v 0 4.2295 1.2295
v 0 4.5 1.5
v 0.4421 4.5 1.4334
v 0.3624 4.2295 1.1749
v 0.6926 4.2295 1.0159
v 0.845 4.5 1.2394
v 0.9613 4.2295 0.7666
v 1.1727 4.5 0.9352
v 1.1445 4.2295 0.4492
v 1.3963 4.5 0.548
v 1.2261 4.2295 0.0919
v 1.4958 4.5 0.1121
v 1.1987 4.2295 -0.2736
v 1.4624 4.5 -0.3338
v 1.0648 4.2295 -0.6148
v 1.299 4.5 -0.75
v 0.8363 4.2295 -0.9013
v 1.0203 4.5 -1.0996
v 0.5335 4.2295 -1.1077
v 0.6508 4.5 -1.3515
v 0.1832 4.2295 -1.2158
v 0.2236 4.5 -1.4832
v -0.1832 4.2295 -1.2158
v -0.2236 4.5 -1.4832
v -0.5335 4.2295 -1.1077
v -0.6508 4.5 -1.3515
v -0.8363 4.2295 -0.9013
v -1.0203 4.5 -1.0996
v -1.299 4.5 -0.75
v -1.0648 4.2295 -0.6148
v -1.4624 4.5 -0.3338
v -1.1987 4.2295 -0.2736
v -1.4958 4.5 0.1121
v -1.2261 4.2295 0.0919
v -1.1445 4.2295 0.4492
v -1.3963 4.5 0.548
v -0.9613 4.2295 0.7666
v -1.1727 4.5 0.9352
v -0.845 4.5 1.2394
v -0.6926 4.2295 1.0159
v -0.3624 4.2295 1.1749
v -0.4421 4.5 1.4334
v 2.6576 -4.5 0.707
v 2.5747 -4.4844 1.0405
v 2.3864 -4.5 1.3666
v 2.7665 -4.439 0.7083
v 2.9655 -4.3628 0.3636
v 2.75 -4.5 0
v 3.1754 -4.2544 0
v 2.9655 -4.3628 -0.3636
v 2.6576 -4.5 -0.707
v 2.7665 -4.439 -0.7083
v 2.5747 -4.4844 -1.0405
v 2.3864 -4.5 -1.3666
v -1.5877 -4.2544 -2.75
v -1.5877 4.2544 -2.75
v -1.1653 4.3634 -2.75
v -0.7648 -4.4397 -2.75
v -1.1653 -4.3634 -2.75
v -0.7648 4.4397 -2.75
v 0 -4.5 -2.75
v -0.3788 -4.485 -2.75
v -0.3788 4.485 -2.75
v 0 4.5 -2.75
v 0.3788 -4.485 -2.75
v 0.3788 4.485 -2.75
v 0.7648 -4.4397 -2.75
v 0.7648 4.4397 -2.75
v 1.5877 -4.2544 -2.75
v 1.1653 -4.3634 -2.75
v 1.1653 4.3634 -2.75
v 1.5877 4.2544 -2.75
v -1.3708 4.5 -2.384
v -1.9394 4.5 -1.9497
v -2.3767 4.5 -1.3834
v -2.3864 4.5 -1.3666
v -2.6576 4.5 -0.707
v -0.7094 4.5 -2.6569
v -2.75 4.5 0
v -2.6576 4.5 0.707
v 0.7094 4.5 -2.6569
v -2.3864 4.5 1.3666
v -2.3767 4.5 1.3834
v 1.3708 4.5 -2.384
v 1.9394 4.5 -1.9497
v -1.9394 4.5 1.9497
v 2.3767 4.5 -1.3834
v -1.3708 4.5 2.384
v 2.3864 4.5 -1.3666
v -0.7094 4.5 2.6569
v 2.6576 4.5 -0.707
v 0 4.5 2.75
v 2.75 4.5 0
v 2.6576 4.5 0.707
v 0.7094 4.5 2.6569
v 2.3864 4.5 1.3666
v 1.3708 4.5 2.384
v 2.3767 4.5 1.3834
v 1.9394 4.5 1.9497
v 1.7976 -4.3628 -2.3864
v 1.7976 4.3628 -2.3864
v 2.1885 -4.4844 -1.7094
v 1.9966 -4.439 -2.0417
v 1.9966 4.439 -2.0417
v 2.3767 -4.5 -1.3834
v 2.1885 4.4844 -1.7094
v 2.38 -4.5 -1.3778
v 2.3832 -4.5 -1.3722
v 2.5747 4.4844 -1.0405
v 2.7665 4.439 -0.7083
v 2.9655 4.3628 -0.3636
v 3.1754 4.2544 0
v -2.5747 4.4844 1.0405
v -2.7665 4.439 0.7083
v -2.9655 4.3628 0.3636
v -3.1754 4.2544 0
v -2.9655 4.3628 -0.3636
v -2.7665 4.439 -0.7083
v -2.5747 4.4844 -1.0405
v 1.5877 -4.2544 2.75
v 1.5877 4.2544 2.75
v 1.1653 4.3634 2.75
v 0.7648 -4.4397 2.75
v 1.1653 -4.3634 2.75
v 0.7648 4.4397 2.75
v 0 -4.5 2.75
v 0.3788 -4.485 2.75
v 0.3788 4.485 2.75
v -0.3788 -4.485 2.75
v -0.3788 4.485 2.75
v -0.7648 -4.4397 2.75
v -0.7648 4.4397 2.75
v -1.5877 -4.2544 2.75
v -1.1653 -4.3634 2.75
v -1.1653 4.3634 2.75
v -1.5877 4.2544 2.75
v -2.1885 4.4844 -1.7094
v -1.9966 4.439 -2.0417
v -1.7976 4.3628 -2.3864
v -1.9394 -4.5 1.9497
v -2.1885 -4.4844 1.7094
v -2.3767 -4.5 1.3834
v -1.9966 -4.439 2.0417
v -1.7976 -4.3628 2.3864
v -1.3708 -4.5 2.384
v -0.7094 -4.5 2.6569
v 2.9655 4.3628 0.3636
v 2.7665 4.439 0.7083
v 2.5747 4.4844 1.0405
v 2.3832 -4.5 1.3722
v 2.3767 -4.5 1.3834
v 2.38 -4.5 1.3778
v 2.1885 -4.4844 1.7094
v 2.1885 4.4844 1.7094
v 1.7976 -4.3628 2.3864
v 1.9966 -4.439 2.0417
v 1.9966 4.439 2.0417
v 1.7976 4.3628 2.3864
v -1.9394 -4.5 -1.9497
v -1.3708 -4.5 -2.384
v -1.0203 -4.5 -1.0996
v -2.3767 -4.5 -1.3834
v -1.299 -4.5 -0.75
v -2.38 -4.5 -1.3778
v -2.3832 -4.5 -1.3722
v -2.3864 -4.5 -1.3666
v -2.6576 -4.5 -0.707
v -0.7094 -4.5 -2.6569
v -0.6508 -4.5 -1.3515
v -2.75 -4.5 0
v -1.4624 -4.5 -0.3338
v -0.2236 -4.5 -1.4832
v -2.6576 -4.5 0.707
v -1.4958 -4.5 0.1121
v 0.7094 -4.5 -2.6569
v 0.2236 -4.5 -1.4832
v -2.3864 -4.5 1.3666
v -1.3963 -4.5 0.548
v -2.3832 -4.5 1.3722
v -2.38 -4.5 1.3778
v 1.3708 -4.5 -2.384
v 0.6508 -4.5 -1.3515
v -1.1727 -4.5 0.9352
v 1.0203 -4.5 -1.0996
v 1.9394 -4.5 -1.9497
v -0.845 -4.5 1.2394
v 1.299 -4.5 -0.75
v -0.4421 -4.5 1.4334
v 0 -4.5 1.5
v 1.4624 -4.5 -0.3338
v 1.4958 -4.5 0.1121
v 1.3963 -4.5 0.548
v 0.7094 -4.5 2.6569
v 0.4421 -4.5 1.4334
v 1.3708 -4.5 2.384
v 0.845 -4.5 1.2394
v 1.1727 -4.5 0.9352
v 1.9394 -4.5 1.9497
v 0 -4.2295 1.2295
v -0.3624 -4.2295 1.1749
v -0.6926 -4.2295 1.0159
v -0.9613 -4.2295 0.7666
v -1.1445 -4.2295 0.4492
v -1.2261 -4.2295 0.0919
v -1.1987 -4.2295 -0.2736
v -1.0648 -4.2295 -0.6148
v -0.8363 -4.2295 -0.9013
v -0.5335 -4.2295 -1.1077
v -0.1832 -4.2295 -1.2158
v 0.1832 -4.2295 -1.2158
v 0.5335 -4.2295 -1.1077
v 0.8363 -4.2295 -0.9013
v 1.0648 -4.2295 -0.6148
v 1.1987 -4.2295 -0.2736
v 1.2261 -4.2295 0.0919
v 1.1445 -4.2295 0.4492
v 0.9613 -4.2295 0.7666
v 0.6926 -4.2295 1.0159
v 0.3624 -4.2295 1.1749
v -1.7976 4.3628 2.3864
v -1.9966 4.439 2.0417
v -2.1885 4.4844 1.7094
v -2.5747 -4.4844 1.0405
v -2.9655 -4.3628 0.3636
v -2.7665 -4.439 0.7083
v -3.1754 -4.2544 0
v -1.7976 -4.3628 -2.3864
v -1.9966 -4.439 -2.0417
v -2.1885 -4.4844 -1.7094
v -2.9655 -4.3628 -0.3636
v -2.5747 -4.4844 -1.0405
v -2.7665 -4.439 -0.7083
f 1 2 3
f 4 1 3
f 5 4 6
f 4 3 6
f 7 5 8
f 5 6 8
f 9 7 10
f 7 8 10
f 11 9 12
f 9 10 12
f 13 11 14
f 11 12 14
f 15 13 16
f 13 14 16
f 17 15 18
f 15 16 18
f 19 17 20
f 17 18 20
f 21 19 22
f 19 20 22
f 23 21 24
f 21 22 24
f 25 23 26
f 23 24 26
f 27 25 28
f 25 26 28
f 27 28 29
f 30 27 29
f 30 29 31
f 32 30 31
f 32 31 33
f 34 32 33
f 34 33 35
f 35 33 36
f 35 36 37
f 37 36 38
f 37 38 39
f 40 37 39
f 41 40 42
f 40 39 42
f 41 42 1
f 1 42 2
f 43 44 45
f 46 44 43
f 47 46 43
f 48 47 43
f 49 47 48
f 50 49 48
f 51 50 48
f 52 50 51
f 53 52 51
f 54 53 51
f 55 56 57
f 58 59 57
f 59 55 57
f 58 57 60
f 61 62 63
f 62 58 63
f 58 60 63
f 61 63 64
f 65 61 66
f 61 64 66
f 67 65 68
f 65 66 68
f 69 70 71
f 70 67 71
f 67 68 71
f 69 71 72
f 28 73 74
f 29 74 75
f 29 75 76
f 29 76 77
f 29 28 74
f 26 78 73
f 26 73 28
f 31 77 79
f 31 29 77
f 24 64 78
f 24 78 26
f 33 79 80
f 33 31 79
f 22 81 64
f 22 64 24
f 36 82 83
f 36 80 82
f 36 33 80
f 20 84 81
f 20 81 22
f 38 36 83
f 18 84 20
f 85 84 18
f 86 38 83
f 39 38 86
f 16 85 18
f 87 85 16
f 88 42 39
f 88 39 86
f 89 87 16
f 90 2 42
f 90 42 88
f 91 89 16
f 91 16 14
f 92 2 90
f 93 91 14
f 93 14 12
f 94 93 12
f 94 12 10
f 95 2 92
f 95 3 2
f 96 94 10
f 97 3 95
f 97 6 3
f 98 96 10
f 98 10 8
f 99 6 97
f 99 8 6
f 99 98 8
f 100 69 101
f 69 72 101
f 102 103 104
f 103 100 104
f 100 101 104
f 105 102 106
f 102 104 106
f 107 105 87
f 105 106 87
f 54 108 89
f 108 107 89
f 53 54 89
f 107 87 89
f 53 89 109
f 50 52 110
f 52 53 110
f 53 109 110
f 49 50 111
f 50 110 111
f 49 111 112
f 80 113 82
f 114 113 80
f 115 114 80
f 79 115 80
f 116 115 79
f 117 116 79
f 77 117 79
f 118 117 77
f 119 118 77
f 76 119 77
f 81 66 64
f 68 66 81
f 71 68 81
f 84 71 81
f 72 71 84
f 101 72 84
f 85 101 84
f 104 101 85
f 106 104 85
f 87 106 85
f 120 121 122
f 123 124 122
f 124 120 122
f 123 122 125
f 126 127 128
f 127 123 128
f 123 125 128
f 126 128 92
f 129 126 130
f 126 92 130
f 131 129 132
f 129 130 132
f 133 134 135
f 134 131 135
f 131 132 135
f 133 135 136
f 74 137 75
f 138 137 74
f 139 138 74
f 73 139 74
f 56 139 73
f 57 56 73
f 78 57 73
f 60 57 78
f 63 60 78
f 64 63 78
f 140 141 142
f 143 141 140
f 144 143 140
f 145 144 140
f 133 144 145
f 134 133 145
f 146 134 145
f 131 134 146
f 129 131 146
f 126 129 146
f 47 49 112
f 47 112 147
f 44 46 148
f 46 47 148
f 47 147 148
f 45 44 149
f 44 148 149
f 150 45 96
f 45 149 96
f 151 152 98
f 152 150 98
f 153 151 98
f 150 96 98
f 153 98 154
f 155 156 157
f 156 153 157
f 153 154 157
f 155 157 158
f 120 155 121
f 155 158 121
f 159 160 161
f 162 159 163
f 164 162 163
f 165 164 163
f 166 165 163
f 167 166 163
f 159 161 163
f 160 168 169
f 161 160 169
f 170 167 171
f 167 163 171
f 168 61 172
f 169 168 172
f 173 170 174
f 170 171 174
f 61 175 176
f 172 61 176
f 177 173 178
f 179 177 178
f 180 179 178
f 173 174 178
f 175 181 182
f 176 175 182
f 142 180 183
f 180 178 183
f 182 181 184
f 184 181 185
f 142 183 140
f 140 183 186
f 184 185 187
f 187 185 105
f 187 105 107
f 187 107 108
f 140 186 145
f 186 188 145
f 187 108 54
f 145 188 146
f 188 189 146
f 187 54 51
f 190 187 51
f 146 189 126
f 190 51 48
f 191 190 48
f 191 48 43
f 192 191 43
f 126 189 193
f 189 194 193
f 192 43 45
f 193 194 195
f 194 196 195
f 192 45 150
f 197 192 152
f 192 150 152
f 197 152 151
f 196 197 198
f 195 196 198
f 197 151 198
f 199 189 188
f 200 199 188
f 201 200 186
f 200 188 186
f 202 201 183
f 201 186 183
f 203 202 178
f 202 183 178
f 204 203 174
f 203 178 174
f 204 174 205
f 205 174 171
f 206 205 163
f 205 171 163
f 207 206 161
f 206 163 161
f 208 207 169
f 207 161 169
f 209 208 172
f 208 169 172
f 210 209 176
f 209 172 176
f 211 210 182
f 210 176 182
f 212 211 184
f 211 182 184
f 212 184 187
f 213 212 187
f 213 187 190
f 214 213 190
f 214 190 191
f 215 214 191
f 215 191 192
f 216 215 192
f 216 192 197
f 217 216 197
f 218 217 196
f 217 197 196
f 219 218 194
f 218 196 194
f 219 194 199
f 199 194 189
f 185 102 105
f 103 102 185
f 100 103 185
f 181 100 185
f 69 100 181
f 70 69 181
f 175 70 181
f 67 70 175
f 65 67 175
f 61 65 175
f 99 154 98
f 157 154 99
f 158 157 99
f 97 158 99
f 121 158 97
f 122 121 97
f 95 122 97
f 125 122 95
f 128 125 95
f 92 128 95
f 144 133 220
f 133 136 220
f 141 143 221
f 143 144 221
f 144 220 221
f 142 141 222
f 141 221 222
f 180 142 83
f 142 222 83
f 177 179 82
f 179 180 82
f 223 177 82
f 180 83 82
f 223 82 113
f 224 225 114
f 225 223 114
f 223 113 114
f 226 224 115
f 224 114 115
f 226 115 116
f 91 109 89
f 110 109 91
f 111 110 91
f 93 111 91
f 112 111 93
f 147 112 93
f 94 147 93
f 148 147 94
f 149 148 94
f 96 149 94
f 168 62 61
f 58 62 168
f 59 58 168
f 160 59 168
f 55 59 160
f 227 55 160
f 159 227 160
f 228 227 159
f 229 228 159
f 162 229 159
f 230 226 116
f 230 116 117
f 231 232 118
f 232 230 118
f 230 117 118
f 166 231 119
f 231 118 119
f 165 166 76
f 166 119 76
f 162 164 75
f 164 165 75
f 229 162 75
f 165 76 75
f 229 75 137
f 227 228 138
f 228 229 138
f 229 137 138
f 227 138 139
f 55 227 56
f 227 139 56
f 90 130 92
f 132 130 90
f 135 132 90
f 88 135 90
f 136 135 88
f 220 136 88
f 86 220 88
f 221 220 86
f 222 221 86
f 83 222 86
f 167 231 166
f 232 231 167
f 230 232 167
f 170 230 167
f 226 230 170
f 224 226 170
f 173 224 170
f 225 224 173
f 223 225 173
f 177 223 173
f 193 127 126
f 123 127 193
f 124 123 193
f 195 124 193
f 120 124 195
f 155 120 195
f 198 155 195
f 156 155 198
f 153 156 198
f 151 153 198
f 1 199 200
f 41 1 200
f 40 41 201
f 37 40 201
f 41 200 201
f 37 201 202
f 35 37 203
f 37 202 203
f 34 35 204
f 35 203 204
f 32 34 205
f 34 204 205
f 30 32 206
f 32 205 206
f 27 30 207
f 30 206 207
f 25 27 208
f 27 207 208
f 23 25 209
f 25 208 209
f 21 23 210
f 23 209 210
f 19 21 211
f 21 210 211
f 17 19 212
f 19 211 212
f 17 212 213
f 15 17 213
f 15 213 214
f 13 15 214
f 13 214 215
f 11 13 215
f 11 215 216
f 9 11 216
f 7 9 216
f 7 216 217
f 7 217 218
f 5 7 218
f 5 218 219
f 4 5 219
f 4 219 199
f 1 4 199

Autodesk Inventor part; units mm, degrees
ref_plane "YZ Plane" through (0, 0, 0) normal (1, 0, 0) x (0, 1, 0)
ref_plane "XZ Plane" through (0, 0, 0) normal (0, 1, 0) x (-1, 0, 0)
ref_plane "XY Plane" through (0, 0, 0) normal (0, 0, 1) x (1, 0, 0)
sketch "スケッチ1" plane through (0, 0, 0) normal (1, 0, 0) x (0, 1, 0)
  line L0 (-4.5, 0) -> (4.5, 0)
  line L1 (0, 0) -> (0, 3.1754) construction
  line L2 (-4.2544, 3.1754) -> (-4.5, 2.75)
  line L3 (-4.5, 2.75) -> (-4.5, 0)
  line L4 (-4.2544, 3.1754) -> (4.2544, 3.1754)
  line L5 (4.2544, 3.1754) -> (4.5, 2.75)
  line L6 (4.5, 2.75) -> (4.5, 0)
  dimension "d1" = 2.75
  dimension "d2" = 3.1754
  dimension "d3" = 30
  dimension "d4" = 9
revolve "回転1" add sketch "スケッチ1" angle 360 about axis through (0, -4.5, 0) along (0, 1, 0)
sketch "スケッチ2" plane through (0, 4.5, 0) normal (0, 1, 0) x (1, 0, 0)
  circle A0 centre (0, 0) radius 3.1754 projected
  line L0 (1.5877, 2.75) -> (3.1754, 0)
  line L1 (3.1754, 0) -> (1.5877, -2.75)
  line L2 (1.5877, -2.75) -> (-1.5877, -2.75)
  line L3 (-1.5877, -2.75) -> (-3.1754, 0)
  line L4 (-3.1754, 0) -> (-1.5877, 2.75)
  line L5 (-1.5877, 2.75) -> (1.5877, 2.75)
  point P0 (0, 0)
  point P1 (-1.5877, 2.75)
  point P2 (-1.5877, 2.75)
  point P3 (-3.1754, 0)
  point P4 (-3.1754, 0)
  point P5 (1.5877, -2.75)
  point P6 (1.5877, -2.75)
  point P7 (3.1754, 0)
  point P8 (3.1754, 0)
extrude "押し出し1" cut sketch "スケッチ2" against normal through all contours L0 A0 | A0 L1 | L5 A0 | A0 L2 | L4 A0 | A0 L3
hole "穴1" at (0, 4.5, 0) direction (0, -1, 0) diameter 2.459 end through all countersink diameter 3 countersink angle 90 thread size "M3x0.5" class "6H" standard "ISO Metric profile"
mirror "ミラー1" about plane through (0, 0, 0) normal (0, 1, 0) of "穴1"
equation "\"d2\" = 1.1547 * d1"
properties part number "ASL-309BE" material "アルミニウム 2014-T4"
